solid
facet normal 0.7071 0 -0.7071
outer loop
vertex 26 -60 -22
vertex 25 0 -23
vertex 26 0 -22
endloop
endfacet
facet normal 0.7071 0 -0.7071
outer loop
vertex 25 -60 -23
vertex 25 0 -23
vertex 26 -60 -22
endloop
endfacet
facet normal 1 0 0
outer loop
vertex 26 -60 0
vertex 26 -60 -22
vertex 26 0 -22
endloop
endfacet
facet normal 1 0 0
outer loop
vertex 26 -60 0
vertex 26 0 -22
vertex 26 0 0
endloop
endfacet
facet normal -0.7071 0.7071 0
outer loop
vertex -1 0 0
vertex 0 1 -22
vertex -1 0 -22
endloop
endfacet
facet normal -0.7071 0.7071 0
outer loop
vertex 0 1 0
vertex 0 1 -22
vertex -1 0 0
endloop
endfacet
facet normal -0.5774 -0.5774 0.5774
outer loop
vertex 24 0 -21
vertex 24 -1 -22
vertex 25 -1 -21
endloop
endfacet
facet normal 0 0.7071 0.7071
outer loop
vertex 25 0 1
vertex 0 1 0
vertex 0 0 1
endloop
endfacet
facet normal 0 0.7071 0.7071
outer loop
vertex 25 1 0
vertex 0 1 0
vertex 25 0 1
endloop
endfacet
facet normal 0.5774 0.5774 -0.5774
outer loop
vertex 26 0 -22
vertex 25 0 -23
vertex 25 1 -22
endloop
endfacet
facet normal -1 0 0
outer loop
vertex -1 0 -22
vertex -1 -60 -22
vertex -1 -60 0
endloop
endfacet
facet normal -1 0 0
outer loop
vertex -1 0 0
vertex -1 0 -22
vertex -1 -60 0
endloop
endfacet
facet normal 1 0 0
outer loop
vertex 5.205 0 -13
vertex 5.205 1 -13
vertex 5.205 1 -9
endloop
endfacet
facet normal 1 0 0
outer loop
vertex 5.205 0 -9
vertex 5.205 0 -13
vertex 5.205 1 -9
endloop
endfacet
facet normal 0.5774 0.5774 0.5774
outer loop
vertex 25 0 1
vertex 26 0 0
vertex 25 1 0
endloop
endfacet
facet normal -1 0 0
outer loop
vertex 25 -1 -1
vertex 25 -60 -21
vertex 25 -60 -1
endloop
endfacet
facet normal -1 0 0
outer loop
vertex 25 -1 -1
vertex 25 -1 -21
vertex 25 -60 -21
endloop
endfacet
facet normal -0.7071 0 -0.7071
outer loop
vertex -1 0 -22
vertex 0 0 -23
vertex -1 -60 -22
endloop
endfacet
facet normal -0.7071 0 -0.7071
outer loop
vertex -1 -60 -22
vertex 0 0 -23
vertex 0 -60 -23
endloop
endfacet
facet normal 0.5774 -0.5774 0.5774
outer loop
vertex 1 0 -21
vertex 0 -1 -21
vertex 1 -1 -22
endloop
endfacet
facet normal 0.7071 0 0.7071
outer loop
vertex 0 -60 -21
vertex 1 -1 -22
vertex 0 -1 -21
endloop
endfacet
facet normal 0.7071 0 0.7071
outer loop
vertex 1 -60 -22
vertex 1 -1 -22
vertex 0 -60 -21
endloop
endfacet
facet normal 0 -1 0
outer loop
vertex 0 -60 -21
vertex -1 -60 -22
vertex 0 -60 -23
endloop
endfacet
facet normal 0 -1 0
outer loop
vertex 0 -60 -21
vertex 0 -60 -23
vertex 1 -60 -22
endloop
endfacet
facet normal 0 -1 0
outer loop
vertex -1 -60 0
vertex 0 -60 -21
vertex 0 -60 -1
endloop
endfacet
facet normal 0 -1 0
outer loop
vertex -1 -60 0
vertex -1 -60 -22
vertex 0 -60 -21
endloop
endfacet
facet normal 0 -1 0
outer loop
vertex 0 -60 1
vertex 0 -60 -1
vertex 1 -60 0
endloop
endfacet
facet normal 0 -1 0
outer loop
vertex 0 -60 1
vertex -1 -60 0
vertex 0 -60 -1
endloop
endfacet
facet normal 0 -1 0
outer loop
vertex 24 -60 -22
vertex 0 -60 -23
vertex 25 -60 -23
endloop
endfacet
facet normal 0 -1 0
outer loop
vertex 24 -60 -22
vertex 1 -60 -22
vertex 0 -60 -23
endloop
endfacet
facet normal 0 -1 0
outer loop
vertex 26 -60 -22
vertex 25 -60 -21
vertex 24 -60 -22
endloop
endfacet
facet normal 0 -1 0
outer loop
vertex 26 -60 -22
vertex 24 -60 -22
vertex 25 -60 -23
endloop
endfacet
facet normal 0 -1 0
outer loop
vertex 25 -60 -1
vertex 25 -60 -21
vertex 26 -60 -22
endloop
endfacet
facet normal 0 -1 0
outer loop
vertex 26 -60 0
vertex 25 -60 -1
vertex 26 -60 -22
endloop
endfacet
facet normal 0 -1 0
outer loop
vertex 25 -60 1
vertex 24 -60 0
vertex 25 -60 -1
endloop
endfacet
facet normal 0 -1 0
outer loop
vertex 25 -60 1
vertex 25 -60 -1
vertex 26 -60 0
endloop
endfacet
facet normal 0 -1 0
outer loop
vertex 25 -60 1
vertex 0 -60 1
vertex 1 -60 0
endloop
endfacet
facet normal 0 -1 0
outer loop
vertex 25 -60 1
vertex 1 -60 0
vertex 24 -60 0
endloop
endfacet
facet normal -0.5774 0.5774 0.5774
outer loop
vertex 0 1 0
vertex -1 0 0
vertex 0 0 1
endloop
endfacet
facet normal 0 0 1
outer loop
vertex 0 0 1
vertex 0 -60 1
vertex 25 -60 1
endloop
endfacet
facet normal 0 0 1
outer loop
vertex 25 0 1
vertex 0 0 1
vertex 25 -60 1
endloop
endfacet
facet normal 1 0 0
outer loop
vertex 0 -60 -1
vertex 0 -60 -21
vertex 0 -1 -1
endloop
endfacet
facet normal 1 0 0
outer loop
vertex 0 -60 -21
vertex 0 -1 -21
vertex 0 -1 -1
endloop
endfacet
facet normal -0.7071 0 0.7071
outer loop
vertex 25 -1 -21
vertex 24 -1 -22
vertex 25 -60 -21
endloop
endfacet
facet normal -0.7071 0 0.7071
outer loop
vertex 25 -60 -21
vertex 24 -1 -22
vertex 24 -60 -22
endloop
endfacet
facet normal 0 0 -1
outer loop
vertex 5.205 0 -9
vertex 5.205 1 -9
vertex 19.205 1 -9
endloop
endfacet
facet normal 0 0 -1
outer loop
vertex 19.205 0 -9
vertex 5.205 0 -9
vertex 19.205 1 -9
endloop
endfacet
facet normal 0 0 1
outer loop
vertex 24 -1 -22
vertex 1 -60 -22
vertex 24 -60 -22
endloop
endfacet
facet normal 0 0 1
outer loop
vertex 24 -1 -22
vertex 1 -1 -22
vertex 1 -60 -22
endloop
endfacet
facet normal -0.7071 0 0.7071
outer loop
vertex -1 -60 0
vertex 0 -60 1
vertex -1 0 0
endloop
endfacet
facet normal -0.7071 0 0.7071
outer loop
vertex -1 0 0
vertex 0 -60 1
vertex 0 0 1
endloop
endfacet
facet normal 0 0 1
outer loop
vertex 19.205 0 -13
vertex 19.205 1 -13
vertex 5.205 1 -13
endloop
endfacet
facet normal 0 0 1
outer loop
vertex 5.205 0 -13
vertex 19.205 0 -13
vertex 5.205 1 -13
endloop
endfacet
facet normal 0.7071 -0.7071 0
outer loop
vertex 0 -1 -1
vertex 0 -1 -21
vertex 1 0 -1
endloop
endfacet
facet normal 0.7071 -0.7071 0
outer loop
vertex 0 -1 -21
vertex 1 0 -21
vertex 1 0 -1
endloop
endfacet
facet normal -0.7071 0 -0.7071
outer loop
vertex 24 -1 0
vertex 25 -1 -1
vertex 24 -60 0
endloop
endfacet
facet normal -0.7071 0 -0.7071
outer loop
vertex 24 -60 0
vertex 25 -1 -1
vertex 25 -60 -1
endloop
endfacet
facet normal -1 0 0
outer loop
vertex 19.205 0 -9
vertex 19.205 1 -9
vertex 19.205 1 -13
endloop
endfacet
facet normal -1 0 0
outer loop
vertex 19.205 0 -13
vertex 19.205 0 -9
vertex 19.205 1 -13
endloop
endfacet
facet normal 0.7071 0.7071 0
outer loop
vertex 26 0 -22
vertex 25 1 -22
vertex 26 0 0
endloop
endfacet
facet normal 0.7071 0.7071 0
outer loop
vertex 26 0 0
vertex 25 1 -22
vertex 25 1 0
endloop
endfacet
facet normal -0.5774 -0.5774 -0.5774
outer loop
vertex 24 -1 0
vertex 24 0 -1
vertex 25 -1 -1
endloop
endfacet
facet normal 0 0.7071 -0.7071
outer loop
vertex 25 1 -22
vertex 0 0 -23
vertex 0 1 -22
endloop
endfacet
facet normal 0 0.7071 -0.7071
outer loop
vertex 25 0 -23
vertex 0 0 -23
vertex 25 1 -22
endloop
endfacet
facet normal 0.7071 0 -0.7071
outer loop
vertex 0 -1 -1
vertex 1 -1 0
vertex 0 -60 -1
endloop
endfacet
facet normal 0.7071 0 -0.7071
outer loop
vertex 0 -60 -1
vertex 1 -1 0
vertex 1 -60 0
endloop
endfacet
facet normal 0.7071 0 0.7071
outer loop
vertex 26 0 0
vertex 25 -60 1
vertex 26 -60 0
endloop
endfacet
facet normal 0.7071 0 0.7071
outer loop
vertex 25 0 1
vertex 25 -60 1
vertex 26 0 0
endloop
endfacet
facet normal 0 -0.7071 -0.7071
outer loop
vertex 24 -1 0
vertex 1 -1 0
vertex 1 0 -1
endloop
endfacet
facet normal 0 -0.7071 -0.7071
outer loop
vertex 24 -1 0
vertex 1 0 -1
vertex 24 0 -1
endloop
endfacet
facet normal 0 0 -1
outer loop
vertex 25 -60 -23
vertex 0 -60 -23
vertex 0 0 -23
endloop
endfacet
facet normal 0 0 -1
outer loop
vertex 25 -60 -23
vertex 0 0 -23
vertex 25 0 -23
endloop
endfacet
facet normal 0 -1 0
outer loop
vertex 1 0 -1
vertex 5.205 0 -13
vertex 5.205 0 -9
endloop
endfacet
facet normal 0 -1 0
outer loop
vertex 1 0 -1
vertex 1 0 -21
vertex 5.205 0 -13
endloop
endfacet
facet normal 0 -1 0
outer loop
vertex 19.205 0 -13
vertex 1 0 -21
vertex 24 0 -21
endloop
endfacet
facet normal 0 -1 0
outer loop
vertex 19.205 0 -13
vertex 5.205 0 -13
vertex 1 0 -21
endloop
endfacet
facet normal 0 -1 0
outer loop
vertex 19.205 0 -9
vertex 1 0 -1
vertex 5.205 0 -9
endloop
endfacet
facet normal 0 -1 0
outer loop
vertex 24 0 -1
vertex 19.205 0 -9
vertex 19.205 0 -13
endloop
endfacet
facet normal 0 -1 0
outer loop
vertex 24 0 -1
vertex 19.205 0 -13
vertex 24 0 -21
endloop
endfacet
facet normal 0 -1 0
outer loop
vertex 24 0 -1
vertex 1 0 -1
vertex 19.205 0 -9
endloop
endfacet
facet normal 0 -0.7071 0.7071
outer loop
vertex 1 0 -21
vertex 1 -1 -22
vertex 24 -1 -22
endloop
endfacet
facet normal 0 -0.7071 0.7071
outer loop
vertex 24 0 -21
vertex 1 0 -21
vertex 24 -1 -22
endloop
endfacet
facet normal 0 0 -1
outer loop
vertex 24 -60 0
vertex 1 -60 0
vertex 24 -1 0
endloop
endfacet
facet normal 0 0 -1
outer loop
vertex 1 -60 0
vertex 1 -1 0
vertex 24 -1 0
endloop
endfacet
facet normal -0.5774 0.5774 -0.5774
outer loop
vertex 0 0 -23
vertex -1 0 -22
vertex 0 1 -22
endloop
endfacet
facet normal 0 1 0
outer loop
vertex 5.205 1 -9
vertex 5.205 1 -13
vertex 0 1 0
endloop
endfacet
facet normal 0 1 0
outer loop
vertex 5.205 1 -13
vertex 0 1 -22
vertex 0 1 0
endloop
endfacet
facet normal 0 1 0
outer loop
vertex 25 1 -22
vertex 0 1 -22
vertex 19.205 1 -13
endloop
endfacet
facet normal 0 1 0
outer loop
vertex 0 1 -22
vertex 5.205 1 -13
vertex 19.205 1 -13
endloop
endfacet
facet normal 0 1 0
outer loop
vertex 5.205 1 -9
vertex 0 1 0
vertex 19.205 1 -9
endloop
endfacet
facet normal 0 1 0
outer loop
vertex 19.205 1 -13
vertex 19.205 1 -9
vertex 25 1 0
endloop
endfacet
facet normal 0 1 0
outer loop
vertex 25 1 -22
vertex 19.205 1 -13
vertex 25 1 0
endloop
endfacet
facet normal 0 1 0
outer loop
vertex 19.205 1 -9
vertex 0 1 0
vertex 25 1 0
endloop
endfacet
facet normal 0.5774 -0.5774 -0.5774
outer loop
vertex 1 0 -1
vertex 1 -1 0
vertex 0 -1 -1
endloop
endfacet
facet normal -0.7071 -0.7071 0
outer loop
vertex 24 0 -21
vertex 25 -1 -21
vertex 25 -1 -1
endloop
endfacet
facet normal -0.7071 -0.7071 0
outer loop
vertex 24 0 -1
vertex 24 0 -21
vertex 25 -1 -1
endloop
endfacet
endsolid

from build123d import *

# Parameters (mm, degrees)
F0_W     = 27
F0_H     = 24
F0_W_2   = 25
F0_H_2   = 22
F1_DEPTH = 60
F2_DEPTH = 1
F3_SIZE  = 1
F5_DEPTH = 25


with BuildPart() as f1:
    # F0 (on Front) → F1 (new body)
    with BuildSketch(Plane.XZ):
        with Locations((12.5, -11)):
            Rectangle(F0_W, F0_H)
        with Locations((12.5, -11)):
            Rectangle(F0_W_2, F0_H_2, mode=Mode.SUBTRACT)
    extrude(amount=F1_DEPTH)

    # F0 (on Front) → F2 (join)
    with BuildSketch(Plane.XZ):
        with Locations((12.5, -11)):
            Rectangle(F0_W, F0_H)
        with Locations((12.5, -11)):
            Rectangle(F0_W_2, F0_H_2, mode=Mode.SUBTRACT)
        with Locations((12.5, -11)):
            Rectangle(F0_W_2, F0_H_2)
    extrude(amount=-F2_DEPTH)

    # F3
    f3_edges = [f1.edges().sort_by_distance(p)[0] for p in [
        (0, -30, 0),
        (12.5, 0, 0),
        (0, 0, -11),
        (0, -30, -22),
        (12.5, 0, -22),
        (25, -30, -22),
        (25, 0, -11),
        (25, -30, 0),
        (-1, -29.5, 1),
        (-1, -29.5, -23),
        (-1, 1, -11),
        (26, -29.5, -23),
        (26, -29.5, 1),
        (12.5, 1, -23),
        (26, 1, -11),
        (12.5, 1, 1),
    ]]
    chamfer(f3_edges, length=F3_SIZE)

    # F4 (on face) → F5 (cut)
    with BuildSketch(Plane(origin=(0, 1, 0), x_dir=(-1, 0, 0), z_dir=(0, 1, 0))):
        Polygon((-19.20536533, -11), (-19.20536533, -13), (-5.20536533, -13), (-5.20536533, -9), (-19.20536533, -9), align=None)
    extrude(amount=-F5_DEPTH, mode=Mode.SUBTRACT)


solid = f1.part
